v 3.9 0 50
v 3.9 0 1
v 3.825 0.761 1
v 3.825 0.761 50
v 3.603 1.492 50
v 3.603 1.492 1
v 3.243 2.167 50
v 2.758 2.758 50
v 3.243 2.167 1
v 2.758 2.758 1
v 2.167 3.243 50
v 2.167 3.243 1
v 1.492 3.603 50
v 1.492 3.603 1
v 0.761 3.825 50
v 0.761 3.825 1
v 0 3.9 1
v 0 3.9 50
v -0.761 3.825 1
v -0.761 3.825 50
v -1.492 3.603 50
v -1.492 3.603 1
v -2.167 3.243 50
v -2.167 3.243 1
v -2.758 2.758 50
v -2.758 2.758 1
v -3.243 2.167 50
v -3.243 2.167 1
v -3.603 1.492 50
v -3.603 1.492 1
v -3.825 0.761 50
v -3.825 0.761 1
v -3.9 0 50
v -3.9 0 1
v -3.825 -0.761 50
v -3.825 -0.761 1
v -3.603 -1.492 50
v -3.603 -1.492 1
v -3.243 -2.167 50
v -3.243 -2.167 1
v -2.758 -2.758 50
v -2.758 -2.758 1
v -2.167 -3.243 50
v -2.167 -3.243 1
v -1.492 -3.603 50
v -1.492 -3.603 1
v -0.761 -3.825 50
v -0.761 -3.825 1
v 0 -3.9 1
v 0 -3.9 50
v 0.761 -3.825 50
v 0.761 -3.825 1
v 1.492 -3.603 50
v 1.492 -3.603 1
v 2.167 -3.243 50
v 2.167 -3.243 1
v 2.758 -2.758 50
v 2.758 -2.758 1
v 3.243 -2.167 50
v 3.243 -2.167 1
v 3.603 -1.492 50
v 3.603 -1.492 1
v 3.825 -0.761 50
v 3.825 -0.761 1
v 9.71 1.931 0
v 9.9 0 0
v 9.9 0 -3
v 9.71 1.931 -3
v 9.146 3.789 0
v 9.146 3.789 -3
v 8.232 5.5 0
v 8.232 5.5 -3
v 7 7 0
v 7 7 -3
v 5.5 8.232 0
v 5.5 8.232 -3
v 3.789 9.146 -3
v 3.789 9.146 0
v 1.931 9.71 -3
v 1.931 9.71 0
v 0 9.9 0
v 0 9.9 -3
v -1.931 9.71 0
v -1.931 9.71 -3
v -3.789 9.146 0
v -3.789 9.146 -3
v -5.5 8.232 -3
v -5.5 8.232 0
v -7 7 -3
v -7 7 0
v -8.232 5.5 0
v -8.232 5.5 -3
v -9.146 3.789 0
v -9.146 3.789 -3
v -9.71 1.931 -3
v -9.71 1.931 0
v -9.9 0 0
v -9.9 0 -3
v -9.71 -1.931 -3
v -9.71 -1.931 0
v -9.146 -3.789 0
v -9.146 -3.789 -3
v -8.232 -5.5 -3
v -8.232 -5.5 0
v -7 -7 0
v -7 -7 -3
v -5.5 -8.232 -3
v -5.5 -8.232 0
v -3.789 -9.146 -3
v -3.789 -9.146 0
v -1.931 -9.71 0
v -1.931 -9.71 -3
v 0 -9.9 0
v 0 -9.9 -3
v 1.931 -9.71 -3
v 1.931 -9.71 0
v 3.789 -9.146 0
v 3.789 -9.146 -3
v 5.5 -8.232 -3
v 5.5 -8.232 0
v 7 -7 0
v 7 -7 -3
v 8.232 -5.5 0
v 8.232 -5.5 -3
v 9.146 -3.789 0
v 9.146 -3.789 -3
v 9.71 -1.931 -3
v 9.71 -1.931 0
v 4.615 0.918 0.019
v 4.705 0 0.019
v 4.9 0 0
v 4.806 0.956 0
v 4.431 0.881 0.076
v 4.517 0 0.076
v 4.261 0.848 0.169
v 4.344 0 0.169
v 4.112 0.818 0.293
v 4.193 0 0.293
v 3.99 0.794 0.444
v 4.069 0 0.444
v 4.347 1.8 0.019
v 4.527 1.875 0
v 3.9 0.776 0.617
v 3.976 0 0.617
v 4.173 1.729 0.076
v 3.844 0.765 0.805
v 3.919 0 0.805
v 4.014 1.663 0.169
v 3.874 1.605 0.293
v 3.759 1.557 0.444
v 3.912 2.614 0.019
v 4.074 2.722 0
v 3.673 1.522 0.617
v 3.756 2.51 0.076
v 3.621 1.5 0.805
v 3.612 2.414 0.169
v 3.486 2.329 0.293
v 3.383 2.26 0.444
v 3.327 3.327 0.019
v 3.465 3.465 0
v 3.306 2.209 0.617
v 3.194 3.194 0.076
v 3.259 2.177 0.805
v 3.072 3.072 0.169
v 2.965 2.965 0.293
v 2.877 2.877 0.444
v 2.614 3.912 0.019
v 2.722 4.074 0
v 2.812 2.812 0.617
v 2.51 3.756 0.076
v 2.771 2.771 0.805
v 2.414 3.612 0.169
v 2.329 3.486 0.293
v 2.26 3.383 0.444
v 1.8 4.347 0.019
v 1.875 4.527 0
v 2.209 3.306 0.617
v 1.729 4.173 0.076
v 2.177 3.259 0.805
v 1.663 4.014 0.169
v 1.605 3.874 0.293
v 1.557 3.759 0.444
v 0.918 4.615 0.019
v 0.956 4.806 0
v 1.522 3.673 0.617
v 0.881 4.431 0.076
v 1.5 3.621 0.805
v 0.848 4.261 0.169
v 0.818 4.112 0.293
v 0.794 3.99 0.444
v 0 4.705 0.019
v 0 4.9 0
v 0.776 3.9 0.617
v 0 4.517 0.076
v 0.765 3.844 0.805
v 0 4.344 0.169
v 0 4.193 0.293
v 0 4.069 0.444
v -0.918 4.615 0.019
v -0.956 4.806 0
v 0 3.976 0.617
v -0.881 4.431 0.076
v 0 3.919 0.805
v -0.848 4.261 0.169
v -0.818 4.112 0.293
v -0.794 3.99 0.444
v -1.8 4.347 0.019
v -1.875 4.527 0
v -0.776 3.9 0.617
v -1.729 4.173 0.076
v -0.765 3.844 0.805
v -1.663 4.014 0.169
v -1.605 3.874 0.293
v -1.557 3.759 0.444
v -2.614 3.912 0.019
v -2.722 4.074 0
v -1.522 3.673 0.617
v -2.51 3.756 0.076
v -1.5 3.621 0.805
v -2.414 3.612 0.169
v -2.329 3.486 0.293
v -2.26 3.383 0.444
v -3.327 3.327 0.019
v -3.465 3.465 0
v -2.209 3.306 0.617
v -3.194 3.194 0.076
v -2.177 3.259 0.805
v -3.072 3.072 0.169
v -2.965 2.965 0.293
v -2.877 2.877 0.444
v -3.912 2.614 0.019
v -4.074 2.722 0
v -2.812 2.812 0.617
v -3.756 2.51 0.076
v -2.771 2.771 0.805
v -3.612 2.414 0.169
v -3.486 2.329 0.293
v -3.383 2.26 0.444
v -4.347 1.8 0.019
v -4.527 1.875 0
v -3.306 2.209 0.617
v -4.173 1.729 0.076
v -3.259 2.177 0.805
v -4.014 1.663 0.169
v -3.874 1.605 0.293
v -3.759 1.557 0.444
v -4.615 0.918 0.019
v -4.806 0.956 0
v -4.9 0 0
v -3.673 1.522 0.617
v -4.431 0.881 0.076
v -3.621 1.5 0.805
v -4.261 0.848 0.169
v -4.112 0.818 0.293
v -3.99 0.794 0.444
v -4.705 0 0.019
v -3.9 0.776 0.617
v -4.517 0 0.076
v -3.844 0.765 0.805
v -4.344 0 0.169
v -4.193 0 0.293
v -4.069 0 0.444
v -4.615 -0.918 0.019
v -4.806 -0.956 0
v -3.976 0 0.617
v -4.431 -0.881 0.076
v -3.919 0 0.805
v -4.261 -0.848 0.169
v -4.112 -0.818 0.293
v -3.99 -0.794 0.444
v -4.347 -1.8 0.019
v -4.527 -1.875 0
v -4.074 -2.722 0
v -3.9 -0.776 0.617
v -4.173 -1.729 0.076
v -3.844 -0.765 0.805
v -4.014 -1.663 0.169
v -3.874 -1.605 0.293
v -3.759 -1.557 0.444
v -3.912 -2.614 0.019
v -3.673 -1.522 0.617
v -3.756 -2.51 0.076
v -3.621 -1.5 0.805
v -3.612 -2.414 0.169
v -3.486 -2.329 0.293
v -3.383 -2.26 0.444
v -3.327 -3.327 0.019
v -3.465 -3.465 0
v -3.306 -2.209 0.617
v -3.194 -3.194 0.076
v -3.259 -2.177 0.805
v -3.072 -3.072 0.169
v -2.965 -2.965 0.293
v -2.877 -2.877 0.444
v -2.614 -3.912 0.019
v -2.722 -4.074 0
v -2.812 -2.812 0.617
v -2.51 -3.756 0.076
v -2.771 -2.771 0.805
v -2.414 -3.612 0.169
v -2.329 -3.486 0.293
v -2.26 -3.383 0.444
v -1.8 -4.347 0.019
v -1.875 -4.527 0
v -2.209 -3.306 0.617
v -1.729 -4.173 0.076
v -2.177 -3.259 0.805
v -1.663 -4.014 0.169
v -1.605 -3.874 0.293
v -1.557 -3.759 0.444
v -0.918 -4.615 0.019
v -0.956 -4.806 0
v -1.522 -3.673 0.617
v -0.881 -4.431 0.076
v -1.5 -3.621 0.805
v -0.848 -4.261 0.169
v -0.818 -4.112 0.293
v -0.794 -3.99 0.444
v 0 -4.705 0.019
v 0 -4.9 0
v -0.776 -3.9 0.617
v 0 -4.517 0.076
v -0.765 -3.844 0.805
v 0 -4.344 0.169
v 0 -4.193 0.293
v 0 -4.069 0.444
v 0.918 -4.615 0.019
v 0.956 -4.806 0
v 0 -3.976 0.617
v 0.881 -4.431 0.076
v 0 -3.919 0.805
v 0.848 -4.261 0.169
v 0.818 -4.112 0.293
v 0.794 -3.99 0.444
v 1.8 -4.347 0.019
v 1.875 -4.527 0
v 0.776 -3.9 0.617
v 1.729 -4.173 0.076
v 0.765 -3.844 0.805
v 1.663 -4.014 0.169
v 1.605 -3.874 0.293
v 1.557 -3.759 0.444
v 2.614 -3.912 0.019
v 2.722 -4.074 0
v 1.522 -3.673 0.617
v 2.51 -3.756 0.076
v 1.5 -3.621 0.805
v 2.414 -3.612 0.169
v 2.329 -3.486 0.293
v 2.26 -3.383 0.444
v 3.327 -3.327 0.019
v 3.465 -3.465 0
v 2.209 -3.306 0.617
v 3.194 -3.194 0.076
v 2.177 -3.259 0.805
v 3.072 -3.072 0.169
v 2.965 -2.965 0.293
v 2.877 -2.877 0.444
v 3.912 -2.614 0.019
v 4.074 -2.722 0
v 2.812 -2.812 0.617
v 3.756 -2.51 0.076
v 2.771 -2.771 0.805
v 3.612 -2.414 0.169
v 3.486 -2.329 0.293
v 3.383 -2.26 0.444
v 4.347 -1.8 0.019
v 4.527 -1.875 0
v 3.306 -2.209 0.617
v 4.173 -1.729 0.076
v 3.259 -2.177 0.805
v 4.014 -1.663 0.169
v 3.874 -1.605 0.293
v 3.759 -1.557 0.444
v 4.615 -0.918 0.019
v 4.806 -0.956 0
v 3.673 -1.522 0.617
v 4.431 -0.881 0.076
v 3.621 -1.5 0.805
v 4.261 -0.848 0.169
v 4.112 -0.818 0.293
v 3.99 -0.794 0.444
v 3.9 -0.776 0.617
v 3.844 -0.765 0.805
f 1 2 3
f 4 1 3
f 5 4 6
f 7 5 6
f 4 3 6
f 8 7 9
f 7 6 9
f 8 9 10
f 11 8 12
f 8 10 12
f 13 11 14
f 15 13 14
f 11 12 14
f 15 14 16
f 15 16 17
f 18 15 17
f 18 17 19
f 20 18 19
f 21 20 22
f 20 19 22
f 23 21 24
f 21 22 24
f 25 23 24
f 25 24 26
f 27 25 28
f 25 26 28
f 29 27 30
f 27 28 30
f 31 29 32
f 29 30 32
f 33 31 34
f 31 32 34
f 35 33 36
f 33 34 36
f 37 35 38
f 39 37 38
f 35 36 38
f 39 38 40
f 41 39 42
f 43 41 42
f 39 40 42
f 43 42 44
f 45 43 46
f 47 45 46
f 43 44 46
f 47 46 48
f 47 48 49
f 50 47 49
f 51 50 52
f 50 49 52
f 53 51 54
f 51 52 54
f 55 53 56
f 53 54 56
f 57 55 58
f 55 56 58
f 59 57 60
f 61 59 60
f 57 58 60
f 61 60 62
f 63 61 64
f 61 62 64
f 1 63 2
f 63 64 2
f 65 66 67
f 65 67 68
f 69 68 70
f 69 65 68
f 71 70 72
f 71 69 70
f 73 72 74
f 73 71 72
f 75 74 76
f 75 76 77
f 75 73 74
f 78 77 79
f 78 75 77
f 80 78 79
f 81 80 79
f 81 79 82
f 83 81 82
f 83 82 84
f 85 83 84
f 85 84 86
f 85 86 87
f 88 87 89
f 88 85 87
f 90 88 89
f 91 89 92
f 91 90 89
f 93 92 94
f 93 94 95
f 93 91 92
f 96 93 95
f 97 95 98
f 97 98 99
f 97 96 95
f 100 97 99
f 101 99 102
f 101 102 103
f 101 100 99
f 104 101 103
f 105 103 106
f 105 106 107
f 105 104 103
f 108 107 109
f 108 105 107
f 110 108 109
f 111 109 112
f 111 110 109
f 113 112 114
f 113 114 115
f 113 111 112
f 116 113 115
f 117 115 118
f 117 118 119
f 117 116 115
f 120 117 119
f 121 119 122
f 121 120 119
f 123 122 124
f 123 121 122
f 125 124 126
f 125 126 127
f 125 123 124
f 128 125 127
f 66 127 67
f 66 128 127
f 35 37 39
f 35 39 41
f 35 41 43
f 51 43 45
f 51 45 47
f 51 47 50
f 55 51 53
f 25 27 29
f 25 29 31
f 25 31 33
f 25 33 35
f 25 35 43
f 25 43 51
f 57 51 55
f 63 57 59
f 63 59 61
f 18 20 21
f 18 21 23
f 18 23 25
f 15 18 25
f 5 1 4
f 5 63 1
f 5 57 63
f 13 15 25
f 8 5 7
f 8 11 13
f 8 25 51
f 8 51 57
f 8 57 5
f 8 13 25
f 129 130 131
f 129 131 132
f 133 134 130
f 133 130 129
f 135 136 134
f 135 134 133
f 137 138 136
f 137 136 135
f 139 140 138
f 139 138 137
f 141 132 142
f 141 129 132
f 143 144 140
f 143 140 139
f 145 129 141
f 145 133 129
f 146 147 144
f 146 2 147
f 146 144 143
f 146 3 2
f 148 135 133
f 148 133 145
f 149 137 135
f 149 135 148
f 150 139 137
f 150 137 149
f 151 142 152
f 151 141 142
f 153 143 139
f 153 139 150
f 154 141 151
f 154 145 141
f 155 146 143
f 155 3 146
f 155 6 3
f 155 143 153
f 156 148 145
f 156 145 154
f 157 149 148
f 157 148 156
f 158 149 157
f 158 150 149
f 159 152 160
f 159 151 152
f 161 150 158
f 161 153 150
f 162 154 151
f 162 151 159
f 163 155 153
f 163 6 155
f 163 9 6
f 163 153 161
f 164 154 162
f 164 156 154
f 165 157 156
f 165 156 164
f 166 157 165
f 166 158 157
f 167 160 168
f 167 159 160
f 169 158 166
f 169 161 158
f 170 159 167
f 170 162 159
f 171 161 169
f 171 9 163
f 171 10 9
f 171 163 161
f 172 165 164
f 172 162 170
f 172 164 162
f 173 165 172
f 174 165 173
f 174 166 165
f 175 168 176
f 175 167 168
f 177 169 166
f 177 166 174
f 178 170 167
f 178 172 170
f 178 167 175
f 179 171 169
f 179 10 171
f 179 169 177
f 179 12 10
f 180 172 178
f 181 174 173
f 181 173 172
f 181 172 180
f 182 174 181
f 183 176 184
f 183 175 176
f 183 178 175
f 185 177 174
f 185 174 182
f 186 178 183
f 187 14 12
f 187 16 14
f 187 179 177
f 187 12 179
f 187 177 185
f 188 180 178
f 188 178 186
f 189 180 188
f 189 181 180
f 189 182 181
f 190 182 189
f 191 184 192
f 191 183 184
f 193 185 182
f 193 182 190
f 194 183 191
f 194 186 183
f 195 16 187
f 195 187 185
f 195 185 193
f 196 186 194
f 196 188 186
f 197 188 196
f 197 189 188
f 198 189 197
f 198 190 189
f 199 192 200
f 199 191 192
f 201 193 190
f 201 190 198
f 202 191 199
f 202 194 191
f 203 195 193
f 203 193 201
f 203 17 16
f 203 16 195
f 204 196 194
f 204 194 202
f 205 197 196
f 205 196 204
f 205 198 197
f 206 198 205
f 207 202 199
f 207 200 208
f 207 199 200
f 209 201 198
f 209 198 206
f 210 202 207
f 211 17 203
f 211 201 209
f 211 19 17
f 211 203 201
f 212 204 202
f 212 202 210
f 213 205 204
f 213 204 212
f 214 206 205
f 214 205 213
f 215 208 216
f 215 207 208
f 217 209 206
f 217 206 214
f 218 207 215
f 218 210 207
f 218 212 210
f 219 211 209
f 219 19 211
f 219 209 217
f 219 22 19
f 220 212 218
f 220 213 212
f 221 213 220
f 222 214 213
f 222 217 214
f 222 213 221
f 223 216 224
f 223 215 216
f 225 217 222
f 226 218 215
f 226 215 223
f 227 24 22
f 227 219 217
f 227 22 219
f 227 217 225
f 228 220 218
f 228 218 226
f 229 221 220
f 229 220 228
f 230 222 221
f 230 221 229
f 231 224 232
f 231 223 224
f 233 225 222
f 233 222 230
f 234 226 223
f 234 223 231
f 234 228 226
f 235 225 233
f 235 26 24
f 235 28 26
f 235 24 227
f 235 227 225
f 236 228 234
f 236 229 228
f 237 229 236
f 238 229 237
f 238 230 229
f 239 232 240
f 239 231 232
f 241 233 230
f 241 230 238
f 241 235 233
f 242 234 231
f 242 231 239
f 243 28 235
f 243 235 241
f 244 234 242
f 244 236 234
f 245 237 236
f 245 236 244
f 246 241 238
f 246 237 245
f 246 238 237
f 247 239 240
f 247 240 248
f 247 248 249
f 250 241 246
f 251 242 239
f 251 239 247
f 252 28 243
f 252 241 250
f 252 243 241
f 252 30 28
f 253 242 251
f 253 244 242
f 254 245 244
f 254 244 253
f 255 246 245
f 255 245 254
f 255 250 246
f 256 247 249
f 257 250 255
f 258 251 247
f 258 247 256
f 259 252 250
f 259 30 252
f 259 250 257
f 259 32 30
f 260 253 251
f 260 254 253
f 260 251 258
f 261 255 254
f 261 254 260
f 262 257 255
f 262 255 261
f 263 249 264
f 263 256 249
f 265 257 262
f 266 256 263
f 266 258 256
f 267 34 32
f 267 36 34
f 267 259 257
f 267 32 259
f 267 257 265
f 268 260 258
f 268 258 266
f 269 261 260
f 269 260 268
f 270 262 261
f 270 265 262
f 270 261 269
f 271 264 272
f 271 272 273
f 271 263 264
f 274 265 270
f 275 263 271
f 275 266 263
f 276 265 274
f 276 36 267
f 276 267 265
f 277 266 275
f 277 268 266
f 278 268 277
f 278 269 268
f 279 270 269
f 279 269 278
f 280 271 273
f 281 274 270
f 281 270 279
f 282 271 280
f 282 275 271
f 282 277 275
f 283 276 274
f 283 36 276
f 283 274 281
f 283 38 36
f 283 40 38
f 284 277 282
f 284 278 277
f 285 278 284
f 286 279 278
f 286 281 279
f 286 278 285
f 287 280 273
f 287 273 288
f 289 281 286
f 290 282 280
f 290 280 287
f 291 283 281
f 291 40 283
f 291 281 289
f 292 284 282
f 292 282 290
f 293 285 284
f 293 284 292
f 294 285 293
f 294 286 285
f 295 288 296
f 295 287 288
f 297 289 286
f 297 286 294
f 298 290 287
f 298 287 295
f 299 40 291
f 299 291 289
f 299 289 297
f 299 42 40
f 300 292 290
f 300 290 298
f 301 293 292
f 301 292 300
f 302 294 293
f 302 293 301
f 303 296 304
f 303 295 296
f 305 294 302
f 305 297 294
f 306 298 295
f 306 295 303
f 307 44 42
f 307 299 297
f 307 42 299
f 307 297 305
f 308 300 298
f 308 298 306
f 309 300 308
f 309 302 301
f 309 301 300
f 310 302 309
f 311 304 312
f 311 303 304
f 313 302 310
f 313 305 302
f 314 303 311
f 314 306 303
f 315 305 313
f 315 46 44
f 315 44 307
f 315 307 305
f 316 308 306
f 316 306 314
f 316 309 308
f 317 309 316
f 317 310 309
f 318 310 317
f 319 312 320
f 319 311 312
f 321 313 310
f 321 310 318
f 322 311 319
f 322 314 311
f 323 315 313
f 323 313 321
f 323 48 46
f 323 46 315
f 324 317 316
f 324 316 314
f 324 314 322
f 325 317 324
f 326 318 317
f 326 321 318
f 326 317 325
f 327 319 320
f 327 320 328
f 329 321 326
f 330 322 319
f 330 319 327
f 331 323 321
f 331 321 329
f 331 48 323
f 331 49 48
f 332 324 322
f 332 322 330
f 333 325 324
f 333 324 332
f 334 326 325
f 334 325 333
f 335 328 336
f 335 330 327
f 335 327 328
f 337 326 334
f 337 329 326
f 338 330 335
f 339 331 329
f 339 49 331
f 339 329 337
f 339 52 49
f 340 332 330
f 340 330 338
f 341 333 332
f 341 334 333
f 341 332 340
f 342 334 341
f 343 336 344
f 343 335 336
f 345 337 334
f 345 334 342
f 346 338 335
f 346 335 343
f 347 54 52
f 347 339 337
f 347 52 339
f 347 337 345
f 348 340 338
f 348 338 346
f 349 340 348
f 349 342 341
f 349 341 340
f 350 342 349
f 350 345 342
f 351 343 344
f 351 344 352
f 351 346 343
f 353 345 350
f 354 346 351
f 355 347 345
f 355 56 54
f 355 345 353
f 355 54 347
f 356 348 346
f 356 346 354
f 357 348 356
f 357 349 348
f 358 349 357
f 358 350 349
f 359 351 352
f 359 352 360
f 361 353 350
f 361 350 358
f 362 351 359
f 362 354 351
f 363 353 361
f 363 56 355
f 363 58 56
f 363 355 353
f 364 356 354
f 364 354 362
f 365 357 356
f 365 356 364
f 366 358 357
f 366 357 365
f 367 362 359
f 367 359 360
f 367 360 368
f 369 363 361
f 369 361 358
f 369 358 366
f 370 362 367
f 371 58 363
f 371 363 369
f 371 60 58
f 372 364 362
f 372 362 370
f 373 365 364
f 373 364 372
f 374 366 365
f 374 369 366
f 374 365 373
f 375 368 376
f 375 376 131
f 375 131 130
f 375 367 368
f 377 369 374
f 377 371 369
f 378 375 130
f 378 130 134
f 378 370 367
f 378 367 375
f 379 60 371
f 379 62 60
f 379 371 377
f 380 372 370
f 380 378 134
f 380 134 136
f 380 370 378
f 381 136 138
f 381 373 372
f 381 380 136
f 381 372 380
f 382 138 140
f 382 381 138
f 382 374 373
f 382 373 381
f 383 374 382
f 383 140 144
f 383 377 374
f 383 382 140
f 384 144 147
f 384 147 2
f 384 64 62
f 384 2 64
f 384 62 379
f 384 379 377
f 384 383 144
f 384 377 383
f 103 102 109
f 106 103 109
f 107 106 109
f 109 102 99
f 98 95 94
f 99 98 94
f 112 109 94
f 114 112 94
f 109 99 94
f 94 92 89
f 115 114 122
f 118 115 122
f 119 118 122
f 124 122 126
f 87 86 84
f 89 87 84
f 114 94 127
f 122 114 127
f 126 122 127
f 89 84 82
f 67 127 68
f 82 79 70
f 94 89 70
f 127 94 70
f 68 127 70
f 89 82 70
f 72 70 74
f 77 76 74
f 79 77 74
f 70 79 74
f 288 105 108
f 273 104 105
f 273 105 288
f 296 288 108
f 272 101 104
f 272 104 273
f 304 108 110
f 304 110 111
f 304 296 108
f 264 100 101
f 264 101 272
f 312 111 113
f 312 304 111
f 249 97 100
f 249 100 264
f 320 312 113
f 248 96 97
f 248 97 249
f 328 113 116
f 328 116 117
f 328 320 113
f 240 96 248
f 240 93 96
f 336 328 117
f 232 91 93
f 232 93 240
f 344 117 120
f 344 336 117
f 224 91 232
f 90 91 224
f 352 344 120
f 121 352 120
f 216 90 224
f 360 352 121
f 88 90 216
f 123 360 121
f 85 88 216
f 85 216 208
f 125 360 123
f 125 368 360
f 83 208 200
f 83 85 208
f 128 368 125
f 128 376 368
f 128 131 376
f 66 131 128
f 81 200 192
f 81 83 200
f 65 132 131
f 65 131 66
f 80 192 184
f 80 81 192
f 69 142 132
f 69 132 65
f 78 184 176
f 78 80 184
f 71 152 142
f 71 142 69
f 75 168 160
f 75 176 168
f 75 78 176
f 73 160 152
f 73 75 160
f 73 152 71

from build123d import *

# Parameters (mm, degrees)
SKETCH1_R           = 3.9
BOSS_EXTRUDE1_DEPTH = 50
SKETCH1_3_R         = 9.9
BOSS_EXTRUDE2_DEPTH = 3
FILLET1_R           = 1


with BuildPart() as part:
    # Sketch1 → Boss-Extrude1 (new body)
    with BuildSketch(Plane.XY):
        Circle(SKETCH1_R)
    extrude(amount=BOSS_EXTRUDE1_DEPTH)

    # Sketch1<3> → Boss-Extrude2 (add)
    with BuildSketch(Plane.XY):
        Circle(SKETCH1_3_R)
    extrude(amount=-BOSS_EXTRUDE2_DEPTH)

    # Fillet1
    fillet1_edges = [part.edges().sort_by_distance(p)[0] for p in [
        (-3.9, 0, 0),
    ]]
    fillet(fillet1_edges, radius=FILLET1_R)


solid = part.part
